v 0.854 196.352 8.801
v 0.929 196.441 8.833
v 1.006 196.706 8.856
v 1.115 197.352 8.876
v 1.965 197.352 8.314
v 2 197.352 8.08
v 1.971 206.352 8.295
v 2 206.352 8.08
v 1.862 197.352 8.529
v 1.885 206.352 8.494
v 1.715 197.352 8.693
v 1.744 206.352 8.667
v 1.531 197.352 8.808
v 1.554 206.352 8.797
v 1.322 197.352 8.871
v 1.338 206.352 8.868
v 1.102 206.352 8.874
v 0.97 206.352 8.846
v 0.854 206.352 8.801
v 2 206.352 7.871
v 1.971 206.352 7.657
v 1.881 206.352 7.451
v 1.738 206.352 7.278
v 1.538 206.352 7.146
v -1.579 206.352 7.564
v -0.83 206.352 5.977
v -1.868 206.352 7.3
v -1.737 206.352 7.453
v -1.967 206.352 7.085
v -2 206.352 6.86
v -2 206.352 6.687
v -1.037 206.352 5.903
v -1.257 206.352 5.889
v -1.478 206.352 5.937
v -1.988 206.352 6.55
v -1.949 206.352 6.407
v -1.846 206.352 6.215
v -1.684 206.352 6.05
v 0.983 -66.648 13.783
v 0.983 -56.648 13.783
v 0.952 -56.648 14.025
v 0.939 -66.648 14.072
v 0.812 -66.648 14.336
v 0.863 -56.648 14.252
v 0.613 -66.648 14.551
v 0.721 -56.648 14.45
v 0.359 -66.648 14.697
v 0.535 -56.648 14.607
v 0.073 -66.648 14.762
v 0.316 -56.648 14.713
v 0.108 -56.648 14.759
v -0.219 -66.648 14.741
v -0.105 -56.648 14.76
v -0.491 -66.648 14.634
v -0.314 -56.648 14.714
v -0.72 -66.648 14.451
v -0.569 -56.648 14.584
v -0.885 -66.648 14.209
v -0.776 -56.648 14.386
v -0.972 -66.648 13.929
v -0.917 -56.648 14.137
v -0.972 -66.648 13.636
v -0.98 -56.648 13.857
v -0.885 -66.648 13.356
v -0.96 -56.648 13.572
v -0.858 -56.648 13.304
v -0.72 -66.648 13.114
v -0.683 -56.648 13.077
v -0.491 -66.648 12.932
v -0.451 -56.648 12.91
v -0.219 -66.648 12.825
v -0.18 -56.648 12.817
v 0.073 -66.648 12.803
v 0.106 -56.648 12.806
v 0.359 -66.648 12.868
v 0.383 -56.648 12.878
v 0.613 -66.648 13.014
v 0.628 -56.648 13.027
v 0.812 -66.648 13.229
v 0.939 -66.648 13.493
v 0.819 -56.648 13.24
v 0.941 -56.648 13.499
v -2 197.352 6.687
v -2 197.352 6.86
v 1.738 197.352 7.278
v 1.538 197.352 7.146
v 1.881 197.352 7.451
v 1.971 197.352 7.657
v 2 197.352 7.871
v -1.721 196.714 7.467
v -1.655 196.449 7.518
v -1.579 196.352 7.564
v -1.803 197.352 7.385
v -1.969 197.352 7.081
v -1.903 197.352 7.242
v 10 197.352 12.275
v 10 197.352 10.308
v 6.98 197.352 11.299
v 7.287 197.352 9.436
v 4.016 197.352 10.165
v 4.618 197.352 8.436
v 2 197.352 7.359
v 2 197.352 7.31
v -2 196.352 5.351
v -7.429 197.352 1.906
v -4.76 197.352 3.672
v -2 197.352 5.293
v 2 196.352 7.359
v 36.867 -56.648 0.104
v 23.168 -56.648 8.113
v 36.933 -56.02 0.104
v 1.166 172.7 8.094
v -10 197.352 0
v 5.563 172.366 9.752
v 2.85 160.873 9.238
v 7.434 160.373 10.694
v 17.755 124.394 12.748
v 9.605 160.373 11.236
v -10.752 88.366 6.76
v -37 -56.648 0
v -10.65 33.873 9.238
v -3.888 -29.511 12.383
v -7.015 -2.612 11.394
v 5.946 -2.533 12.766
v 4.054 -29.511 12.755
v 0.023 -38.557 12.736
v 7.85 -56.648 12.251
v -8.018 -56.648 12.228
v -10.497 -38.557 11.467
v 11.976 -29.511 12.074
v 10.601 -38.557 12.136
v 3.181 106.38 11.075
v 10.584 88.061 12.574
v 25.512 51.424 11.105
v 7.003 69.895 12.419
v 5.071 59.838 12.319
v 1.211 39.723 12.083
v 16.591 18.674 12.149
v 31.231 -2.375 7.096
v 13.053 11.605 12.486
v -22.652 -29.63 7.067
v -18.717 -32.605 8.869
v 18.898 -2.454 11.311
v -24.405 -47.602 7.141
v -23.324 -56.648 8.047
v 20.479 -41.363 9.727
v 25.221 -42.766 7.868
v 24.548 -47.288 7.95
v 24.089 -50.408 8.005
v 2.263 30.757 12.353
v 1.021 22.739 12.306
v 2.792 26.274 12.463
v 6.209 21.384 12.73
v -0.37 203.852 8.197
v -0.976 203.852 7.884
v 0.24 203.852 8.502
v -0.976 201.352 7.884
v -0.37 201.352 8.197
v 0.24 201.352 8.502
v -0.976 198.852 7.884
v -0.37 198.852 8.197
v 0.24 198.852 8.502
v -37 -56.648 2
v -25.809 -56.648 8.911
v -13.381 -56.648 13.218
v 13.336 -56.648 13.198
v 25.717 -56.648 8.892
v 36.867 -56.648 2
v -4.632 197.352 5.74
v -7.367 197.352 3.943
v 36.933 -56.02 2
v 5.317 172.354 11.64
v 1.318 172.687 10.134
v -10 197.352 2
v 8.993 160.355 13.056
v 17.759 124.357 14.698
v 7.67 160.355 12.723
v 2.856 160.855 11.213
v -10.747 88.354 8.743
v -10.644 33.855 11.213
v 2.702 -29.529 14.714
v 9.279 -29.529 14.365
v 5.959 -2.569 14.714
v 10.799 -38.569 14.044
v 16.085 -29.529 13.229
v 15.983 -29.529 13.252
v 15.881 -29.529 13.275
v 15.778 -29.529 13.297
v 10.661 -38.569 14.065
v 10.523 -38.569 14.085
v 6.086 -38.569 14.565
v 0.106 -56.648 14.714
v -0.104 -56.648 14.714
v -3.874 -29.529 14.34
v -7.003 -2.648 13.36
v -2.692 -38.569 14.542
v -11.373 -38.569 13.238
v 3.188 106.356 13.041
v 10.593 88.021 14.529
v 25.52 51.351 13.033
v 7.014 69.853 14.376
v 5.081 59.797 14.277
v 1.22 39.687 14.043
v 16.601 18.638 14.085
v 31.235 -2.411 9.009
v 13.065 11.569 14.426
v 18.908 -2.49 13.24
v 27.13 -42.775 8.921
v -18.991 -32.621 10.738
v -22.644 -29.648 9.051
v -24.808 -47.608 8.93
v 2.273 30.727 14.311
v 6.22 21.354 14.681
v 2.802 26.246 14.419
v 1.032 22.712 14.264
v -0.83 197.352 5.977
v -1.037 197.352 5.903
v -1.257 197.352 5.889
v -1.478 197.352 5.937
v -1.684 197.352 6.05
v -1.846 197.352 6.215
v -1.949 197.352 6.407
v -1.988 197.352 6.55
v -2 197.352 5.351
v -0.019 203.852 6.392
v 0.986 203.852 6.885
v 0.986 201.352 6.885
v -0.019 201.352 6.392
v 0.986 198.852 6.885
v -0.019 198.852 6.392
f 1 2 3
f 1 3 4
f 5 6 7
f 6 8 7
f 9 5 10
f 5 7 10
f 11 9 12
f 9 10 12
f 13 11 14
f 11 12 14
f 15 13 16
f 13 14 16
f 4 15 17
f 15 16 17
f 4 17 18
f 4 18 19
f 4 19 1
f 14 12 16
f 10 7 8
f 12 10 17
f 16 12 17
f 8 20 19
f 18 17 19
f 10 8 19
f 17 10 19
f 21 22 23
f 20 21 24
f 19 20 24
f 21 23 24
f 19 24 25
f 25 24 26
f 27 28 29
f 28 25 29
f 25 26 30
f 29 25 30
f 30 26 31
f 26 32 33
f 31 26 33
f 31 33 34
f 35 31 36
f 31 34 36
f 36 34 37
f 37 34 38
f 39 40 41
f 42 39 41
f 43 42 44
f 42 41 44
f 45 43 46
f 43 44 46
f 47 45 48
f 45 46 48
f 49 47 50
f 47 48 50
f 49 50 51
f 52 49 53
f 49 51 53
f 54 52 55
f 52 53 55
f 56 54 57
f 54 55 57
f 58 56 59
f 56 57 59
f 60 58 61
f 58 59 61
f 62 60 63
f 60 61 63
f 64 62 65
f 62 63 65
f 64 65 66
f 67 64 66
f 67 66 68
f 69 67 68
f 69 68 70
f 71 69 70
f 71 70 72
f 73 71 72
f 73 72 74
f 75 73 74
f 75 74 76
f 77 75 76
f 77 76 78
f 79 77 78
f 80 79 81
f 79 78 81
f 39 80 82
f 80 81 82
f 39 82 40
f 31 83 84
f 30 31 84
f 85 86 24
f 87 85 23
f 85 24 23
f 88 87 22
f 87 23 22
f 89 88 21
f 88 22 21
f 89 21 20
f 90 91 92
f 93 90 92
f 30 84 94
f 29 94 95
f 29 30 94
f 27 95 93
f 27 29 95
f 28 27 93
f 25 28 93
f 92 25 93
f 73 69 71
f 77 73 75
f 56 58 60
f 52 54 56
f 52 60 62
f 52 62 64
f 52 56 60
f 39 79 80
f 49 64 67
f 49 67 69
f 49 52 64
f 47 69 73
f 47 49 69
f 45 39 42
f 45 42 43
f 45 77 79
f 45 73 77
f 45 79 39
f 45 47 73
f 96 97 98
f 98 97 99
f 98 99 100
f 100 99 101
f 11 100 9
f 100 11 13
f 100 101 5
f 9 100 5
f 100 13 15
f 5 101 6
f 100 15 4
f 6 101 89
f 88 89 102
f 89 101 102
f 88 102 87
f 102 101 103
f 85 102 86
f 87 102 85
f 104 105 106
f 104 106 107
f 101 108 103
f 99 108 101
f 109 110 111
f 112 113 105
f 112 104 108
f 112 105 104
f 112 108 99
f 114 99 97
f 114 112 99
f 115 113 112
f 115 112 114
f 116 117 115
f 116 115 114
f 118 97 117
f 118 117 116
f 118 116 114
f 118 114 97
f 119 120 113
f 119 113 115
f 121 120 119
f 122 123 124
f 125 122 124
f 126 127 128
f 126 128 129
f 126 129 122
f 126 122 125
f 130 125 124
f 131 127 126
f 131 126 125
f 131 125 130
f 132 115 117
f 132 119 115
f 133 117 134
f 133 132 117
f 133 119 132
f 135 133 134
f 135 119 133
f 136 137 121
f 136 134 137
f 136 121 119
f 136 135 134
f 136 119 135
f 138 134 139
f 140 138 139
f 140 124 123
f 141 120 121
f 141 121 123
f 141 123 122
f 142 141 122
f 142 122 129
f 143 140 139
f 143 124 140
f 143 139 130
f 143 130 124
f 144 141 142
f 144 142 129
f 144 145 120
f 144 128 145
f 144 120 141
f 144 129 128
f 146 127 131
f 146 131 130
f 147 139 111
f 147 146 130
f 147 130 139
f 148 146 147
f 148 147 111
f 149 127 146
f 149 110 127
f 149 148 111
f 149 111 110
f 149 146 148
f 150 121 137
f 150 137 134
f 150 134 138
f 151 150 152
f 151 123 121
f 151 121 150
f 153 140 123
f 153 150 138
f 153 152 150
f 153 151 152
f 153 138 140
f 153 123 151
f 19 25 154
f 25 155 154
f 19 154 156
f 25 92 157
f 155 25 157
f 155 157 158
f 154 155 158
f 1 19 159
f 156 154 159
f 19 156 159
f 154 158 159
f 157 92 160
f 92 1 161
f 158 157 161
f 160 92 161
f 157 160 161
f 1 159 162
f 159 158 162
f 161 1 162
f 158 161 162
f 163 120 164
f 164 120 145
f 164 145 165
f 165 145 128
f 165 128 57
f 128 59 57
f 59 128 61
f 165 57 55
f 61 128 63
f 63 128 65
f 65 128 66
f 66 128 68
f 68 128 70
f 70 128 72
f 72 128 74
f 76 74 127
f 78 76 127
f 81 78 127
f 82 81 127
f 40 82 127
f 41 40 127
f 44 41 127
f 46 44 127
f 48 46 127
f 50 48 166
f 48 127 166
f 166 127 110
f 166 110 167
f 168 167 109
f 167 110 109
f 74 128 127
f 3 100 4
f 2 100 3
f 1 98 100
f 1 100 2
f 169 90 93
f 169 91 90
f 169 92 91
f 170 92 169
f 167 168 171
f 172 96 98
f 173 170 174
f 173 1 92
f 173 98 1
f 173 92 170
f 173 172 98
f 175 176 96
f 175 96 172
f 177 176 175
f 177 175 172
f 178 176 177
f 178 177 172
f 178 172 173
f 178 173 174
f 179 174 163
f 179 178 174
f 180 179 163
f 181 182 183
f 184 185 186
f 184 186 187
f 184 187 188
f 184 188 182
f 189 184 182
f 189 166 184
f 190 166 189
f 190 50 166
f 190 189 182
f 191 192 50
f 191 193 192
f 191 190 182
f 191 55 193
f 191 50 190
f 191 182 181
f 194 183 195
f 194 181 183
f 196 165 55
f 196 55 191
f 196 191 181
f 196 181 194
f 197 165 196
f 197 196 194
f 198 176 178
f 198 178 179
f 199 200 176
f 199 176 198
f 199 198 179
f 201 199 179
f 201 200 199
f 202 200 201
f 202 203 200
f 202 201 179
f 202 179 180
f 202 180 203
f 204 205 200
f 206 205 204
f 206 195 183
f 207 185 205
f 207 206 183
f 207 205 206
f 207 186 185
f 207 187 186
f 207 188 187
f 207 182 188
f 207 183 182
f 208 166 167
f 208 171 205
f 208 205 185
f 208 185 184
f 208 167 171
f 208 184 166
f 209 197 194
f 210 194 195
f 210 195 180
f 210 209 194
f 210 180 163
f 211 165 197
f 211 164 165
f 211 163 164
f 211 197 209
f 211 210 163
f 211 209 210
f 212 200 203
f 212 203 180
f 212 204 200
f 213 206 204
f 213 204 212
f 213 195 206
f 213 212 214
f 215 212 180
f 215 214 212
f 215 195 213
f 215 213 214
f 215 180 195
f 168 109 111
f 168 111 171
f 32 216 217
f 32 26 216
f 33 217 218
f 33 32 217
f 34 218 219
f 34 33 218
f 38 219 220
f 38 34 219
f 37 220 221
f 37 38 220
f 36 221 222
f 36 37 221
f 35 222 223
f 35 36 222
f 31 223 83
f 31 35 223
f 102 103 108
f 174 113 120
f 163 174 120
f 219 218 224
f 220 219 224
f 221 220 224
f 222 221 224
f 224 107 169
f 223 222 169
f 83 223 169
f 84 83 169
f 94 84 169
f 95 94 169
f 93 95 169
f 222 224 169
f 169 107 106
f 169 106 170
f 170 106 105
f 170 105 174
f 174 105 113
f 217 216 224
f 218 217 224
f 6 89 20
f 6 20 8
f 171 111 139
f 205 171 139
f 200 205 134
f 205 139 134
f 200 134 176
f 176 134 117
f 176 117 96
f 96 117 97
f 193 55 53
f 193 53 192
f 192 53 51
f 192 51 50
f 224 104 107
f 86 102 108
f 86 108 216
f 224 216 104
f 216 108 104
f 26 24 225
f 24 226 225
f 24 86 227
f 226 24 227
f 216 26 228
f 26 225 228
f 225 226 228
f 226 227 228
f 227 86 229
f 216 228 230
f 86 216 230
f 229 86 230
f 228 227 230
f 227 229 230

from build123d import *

# Parameters (mm, degrees)
F1_DEPTH = 25
F4_DEPTH = 10
F5_R     = 0.8
F6_R     = 0.9825772789
F7_DEPTH = 10


with BuildPart() as f1:
    # F0 (on Top) → F1 (new body)
    with BuildSketch(Plane.XY):
        Polygon((-37, -56.6475350804), (-2, -56.6475350804), (2, -56.6475350804), (37, -56.6475350804), (10, 197.3524649196), (2, 197.3524649196), (2, 196.3524649196), (-2, 196.3524649196), (-2, 197.3524649196), (-10, 197.3524649196), align=None)
    extrude(amount=F1_DEPTH)

    # F3: sweep along a path in F3_path
    with BuildLine(Plane(origin=(-10, 197.3524649196, 0), x_dir=(0.1057036895, 0.994397672, 0), z_dir=(-0.994397672, 0.1057036895, 0))) as f3_path:
        Line((0, 0), (-255.4310082977, 0))
    # F2 (on face) → F3 (sweep, intersect)
    with BuildSketch(Plane.XZ.offset(56.6475350804)):
        with BuildLine():
            ThreePointArc((-37, 0), (-0.0846525336, 12.7664775684), (36.8665717542, 0.1042166445))
            Line((36.8665717542, 0.1042166445), (36.8665717542, 2))
            ThreePointArc((36.8665717542, 2), (-0.0667141229, 14.7143531892), (-37, 2))
            Line((-37, 2), (-37, 0))
        make_face()
    sweep(path=f3_path.line, mode=Mode.INTERSECT)

    # F4 (add): a face of the model
    f4_faces = [f1.faces().sort_by_distance(p)[0] for p in [
        (-0.0010475513, 196.3524649196, 7.3762184587),
    ]]
    extrude(f4_faces, amount=F4_DEPTH)

    # F5
    f5_edges = [f1.edges().sort_by_distance(p)[0] for p in [
        (2, 201.852465, 7.358695),
        (2, 201.352465, 9.336883),
        (-2, 201.852465, 5.351269),
        (-2, 201.352465, 7.335688),
    ]]
    fillet(f5_edges, radius=F5_R)

    # F6 (on face) → F7 (join)
    with BuildSketch(Plane.XZ.offset(56.6475350804)):
        with Locations((0, 13.7826548889)):
            Circle(F6_R)
    extrude(amount=F7_DEPTH)


solid = f1.part
